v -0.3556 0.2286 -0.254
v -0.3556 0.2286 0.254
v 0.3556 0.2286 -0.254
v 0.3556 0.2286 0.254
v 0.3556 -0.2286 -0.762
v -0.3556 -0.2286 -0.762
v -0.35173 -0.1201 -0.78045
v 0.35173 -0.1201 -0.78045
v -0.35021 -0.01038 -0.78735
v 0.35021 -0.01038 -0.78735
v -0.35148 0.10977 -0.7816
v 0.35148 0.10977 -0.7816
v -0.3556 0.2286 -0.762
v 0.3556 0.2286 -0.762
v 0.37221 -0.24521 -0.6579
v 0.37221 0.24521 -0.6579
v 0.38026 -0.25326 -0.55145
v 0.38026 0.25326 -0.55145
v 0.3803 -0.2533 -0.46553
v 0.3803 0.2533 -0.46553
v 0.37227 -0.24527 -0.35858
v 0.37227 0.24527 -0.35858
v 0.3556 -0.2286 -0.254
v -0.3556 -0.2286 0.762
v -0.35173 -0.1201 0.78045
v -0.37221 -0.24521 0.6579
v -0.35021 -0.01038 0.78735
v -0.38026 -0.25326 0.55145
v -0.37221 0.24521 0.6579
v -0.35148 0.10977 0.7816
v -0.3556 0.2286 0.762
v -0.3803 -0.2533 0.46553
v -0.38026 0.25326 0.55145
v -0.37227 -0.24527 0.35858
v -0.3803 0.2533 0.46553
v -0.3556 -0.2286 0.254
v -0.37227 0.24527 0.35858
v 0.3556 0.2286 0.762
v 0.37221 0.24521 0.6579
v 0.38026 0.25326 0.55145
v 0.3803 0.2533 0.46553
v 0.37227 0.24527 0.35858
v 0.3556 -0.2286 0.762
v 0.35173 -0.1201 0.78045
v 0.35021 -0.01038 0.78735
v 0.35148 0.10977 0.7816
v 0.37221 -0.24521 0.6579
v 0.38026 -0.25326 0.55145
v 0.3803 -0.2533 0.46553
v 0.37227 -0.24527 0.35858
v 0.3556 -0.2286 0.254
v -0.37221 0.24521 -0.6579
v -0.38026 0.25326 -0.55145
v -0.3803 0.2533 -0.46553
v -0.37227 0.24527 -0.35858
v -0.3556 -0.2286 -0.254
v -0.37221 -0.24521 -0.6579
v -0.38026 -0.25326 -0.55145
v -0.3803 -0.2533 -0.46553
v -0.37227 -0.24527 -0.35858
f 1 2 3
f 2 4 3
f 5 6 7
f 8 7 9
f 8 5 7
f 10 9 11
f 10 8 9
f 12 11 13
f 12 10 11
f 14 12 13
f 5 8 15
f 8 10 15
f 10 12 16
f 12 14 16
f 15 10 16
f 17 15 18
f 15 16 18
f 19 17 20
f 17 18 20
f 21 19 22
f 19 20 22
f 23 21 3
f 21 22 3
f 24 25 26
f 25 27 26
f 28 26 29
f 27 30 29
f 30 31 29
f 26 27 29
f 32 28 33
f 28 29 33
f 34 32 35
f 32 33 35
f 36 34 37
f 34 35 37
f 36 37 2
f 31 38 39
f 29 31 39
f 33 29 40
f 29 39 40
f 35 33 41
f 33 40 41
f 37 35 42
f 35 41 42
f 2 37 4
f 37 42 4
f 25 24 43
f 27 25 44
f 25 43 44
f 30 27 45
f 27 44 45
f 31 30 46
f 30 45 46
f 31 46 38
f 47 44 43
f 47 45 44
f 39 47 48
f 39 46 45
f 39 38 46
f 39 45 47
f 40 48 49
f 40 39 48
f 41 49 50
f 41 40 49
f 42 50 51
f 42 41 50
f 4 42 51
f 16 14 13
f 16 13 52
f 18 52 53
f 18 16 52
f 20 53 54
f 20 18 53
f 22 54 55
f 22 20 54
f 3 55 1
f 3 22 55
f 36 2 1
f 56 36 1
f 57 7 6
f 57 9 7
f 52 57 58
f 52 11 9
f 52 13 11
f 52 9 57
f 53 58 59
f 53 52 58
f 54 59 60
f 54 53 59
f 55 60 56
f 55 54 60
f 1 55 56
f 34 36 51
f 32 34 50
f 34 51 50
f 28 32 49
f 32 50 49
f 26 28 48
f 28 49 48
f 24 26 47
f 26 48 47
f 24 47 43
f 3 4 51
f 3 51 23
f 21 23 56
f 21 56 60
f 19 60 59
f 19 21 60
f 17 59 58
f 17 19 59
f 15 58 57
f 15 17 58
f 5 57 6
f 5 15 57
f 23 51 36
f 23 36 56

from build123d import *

# Parameters (mm, degrees)
SKETCH1_W            = 0.508
SKETCH1_H            = 0.4572
BOSS_EXTRUDE1_DEPTH  = 0.3556
BOSS_EXTRUDE3_DEPTH  = 0.4572
CUT_EXTRUDE1_DEPTH   = 0.4572
MIRROR2_COPY_1_DEPTH = 0.4572


with BuildPart() as part:
    # Sketch1 → Boss-Extrude1 (new, symmetric)
    with BuildSketch(Plane(origin=(0, 0, 0), x_dir=(0, 0, -1), z_dir=(1, 0, 0))):
        Rectangle(SKETCH1_W, SKETCH1_H)
    extrude(amount=BOSS_EXTRUDE1_DEPTH, both=True)

    # Sketch3 → Boss-Extrude3 (add, symmetric)
    with BuildSketch(Plane(origin=(0, 0, 0), x_dir=(0, 0, -1), z_dir=(1, 0, 0))):
        with BuildLine():
            Line((0.254, 0.2286), (0.254, -0.2286))
            ThreePointArc((0.254, -0.2286), (0.508, -0.254), (0.762, -0.2286))
            ThreePointArc((0.762, -0.2286), (0.7874, 0), (0.762, 0.2286))
            ThreePointArc((0.762, 0.2286), (0.508, 0.254), (0.254, 0.2286))
        make_face()
    boss_extrude3 = extrude(amount=BOSS_EXTRUDE3_DEPTH, both=True)

    # Sketch4 → Cut-Extrude1 (cut, symmetric)
    with BuildSketch(Plane(origin=(0, 0, 0), x_dir=(1, 0, 0), z_dir=(0, 1, 0))):
        with BuildLine():
            Line((0.3556, 0.254), (0.582576635, 0.027023365))
            Line((0.582576635, 0.027023365), (0.582576635, 1.080487575))
            Line((0.582576635, 1.080487575), (0.338299002, 0.836209942))
            ThreePointArc((0.338299002, 0.836209942), (0.380434034, 0.5461), (0.3556, 0.254))
        make_face()
    cut_extrude1 = extrude(amount=CUT_EXTRUDE1_DEPTH, both=True, mode=Mode.SUBTRACT)

    # Mirror1: Cut-Extrude1 across plane
    add(cut_extrude1.mirror(Plane(origin=(0, 0, 0), x_dir=(0, 0, 1), z_dir=(1, 0, 0))), mode=Mode.SUBTRACT)

    # Mirror2: Boss-Extrude3, Cut-Extrude1 across plane
    add(boss_extrude3.mirror(Plane.XY))
    add(cut_extrude1.mirror(Plane.XY), mode=Mode.SUBTRACT)

    # Mirror2 copy 1 sketch → Mirror2 copy 1 (cut, symmetric)
    with BuildSketch(Plane(origin=(0, 0, 0), x_dir=(-1, 0, 0), z_dir=(0, 1, 0))):
        with BuildLine():
            Line((0.3556, 0.254), (0.582576635, 0.027023365))
            Line((0.582576635, 0.027023365), (0.582576635, 1.080487575))
            Line((0.582576635, 1.080487575), (0.338299002, 0.836209942))
            ThreePointArc((0.338299002, 0.836209942), (0.380434034, 0.5461), (0.3556, 0.254))
        make_face()
    extrude(amount=MIRROR2_COPY_1_DEPTH, both=True, mode=Mode.SUBTRACT)


solid = part.part
